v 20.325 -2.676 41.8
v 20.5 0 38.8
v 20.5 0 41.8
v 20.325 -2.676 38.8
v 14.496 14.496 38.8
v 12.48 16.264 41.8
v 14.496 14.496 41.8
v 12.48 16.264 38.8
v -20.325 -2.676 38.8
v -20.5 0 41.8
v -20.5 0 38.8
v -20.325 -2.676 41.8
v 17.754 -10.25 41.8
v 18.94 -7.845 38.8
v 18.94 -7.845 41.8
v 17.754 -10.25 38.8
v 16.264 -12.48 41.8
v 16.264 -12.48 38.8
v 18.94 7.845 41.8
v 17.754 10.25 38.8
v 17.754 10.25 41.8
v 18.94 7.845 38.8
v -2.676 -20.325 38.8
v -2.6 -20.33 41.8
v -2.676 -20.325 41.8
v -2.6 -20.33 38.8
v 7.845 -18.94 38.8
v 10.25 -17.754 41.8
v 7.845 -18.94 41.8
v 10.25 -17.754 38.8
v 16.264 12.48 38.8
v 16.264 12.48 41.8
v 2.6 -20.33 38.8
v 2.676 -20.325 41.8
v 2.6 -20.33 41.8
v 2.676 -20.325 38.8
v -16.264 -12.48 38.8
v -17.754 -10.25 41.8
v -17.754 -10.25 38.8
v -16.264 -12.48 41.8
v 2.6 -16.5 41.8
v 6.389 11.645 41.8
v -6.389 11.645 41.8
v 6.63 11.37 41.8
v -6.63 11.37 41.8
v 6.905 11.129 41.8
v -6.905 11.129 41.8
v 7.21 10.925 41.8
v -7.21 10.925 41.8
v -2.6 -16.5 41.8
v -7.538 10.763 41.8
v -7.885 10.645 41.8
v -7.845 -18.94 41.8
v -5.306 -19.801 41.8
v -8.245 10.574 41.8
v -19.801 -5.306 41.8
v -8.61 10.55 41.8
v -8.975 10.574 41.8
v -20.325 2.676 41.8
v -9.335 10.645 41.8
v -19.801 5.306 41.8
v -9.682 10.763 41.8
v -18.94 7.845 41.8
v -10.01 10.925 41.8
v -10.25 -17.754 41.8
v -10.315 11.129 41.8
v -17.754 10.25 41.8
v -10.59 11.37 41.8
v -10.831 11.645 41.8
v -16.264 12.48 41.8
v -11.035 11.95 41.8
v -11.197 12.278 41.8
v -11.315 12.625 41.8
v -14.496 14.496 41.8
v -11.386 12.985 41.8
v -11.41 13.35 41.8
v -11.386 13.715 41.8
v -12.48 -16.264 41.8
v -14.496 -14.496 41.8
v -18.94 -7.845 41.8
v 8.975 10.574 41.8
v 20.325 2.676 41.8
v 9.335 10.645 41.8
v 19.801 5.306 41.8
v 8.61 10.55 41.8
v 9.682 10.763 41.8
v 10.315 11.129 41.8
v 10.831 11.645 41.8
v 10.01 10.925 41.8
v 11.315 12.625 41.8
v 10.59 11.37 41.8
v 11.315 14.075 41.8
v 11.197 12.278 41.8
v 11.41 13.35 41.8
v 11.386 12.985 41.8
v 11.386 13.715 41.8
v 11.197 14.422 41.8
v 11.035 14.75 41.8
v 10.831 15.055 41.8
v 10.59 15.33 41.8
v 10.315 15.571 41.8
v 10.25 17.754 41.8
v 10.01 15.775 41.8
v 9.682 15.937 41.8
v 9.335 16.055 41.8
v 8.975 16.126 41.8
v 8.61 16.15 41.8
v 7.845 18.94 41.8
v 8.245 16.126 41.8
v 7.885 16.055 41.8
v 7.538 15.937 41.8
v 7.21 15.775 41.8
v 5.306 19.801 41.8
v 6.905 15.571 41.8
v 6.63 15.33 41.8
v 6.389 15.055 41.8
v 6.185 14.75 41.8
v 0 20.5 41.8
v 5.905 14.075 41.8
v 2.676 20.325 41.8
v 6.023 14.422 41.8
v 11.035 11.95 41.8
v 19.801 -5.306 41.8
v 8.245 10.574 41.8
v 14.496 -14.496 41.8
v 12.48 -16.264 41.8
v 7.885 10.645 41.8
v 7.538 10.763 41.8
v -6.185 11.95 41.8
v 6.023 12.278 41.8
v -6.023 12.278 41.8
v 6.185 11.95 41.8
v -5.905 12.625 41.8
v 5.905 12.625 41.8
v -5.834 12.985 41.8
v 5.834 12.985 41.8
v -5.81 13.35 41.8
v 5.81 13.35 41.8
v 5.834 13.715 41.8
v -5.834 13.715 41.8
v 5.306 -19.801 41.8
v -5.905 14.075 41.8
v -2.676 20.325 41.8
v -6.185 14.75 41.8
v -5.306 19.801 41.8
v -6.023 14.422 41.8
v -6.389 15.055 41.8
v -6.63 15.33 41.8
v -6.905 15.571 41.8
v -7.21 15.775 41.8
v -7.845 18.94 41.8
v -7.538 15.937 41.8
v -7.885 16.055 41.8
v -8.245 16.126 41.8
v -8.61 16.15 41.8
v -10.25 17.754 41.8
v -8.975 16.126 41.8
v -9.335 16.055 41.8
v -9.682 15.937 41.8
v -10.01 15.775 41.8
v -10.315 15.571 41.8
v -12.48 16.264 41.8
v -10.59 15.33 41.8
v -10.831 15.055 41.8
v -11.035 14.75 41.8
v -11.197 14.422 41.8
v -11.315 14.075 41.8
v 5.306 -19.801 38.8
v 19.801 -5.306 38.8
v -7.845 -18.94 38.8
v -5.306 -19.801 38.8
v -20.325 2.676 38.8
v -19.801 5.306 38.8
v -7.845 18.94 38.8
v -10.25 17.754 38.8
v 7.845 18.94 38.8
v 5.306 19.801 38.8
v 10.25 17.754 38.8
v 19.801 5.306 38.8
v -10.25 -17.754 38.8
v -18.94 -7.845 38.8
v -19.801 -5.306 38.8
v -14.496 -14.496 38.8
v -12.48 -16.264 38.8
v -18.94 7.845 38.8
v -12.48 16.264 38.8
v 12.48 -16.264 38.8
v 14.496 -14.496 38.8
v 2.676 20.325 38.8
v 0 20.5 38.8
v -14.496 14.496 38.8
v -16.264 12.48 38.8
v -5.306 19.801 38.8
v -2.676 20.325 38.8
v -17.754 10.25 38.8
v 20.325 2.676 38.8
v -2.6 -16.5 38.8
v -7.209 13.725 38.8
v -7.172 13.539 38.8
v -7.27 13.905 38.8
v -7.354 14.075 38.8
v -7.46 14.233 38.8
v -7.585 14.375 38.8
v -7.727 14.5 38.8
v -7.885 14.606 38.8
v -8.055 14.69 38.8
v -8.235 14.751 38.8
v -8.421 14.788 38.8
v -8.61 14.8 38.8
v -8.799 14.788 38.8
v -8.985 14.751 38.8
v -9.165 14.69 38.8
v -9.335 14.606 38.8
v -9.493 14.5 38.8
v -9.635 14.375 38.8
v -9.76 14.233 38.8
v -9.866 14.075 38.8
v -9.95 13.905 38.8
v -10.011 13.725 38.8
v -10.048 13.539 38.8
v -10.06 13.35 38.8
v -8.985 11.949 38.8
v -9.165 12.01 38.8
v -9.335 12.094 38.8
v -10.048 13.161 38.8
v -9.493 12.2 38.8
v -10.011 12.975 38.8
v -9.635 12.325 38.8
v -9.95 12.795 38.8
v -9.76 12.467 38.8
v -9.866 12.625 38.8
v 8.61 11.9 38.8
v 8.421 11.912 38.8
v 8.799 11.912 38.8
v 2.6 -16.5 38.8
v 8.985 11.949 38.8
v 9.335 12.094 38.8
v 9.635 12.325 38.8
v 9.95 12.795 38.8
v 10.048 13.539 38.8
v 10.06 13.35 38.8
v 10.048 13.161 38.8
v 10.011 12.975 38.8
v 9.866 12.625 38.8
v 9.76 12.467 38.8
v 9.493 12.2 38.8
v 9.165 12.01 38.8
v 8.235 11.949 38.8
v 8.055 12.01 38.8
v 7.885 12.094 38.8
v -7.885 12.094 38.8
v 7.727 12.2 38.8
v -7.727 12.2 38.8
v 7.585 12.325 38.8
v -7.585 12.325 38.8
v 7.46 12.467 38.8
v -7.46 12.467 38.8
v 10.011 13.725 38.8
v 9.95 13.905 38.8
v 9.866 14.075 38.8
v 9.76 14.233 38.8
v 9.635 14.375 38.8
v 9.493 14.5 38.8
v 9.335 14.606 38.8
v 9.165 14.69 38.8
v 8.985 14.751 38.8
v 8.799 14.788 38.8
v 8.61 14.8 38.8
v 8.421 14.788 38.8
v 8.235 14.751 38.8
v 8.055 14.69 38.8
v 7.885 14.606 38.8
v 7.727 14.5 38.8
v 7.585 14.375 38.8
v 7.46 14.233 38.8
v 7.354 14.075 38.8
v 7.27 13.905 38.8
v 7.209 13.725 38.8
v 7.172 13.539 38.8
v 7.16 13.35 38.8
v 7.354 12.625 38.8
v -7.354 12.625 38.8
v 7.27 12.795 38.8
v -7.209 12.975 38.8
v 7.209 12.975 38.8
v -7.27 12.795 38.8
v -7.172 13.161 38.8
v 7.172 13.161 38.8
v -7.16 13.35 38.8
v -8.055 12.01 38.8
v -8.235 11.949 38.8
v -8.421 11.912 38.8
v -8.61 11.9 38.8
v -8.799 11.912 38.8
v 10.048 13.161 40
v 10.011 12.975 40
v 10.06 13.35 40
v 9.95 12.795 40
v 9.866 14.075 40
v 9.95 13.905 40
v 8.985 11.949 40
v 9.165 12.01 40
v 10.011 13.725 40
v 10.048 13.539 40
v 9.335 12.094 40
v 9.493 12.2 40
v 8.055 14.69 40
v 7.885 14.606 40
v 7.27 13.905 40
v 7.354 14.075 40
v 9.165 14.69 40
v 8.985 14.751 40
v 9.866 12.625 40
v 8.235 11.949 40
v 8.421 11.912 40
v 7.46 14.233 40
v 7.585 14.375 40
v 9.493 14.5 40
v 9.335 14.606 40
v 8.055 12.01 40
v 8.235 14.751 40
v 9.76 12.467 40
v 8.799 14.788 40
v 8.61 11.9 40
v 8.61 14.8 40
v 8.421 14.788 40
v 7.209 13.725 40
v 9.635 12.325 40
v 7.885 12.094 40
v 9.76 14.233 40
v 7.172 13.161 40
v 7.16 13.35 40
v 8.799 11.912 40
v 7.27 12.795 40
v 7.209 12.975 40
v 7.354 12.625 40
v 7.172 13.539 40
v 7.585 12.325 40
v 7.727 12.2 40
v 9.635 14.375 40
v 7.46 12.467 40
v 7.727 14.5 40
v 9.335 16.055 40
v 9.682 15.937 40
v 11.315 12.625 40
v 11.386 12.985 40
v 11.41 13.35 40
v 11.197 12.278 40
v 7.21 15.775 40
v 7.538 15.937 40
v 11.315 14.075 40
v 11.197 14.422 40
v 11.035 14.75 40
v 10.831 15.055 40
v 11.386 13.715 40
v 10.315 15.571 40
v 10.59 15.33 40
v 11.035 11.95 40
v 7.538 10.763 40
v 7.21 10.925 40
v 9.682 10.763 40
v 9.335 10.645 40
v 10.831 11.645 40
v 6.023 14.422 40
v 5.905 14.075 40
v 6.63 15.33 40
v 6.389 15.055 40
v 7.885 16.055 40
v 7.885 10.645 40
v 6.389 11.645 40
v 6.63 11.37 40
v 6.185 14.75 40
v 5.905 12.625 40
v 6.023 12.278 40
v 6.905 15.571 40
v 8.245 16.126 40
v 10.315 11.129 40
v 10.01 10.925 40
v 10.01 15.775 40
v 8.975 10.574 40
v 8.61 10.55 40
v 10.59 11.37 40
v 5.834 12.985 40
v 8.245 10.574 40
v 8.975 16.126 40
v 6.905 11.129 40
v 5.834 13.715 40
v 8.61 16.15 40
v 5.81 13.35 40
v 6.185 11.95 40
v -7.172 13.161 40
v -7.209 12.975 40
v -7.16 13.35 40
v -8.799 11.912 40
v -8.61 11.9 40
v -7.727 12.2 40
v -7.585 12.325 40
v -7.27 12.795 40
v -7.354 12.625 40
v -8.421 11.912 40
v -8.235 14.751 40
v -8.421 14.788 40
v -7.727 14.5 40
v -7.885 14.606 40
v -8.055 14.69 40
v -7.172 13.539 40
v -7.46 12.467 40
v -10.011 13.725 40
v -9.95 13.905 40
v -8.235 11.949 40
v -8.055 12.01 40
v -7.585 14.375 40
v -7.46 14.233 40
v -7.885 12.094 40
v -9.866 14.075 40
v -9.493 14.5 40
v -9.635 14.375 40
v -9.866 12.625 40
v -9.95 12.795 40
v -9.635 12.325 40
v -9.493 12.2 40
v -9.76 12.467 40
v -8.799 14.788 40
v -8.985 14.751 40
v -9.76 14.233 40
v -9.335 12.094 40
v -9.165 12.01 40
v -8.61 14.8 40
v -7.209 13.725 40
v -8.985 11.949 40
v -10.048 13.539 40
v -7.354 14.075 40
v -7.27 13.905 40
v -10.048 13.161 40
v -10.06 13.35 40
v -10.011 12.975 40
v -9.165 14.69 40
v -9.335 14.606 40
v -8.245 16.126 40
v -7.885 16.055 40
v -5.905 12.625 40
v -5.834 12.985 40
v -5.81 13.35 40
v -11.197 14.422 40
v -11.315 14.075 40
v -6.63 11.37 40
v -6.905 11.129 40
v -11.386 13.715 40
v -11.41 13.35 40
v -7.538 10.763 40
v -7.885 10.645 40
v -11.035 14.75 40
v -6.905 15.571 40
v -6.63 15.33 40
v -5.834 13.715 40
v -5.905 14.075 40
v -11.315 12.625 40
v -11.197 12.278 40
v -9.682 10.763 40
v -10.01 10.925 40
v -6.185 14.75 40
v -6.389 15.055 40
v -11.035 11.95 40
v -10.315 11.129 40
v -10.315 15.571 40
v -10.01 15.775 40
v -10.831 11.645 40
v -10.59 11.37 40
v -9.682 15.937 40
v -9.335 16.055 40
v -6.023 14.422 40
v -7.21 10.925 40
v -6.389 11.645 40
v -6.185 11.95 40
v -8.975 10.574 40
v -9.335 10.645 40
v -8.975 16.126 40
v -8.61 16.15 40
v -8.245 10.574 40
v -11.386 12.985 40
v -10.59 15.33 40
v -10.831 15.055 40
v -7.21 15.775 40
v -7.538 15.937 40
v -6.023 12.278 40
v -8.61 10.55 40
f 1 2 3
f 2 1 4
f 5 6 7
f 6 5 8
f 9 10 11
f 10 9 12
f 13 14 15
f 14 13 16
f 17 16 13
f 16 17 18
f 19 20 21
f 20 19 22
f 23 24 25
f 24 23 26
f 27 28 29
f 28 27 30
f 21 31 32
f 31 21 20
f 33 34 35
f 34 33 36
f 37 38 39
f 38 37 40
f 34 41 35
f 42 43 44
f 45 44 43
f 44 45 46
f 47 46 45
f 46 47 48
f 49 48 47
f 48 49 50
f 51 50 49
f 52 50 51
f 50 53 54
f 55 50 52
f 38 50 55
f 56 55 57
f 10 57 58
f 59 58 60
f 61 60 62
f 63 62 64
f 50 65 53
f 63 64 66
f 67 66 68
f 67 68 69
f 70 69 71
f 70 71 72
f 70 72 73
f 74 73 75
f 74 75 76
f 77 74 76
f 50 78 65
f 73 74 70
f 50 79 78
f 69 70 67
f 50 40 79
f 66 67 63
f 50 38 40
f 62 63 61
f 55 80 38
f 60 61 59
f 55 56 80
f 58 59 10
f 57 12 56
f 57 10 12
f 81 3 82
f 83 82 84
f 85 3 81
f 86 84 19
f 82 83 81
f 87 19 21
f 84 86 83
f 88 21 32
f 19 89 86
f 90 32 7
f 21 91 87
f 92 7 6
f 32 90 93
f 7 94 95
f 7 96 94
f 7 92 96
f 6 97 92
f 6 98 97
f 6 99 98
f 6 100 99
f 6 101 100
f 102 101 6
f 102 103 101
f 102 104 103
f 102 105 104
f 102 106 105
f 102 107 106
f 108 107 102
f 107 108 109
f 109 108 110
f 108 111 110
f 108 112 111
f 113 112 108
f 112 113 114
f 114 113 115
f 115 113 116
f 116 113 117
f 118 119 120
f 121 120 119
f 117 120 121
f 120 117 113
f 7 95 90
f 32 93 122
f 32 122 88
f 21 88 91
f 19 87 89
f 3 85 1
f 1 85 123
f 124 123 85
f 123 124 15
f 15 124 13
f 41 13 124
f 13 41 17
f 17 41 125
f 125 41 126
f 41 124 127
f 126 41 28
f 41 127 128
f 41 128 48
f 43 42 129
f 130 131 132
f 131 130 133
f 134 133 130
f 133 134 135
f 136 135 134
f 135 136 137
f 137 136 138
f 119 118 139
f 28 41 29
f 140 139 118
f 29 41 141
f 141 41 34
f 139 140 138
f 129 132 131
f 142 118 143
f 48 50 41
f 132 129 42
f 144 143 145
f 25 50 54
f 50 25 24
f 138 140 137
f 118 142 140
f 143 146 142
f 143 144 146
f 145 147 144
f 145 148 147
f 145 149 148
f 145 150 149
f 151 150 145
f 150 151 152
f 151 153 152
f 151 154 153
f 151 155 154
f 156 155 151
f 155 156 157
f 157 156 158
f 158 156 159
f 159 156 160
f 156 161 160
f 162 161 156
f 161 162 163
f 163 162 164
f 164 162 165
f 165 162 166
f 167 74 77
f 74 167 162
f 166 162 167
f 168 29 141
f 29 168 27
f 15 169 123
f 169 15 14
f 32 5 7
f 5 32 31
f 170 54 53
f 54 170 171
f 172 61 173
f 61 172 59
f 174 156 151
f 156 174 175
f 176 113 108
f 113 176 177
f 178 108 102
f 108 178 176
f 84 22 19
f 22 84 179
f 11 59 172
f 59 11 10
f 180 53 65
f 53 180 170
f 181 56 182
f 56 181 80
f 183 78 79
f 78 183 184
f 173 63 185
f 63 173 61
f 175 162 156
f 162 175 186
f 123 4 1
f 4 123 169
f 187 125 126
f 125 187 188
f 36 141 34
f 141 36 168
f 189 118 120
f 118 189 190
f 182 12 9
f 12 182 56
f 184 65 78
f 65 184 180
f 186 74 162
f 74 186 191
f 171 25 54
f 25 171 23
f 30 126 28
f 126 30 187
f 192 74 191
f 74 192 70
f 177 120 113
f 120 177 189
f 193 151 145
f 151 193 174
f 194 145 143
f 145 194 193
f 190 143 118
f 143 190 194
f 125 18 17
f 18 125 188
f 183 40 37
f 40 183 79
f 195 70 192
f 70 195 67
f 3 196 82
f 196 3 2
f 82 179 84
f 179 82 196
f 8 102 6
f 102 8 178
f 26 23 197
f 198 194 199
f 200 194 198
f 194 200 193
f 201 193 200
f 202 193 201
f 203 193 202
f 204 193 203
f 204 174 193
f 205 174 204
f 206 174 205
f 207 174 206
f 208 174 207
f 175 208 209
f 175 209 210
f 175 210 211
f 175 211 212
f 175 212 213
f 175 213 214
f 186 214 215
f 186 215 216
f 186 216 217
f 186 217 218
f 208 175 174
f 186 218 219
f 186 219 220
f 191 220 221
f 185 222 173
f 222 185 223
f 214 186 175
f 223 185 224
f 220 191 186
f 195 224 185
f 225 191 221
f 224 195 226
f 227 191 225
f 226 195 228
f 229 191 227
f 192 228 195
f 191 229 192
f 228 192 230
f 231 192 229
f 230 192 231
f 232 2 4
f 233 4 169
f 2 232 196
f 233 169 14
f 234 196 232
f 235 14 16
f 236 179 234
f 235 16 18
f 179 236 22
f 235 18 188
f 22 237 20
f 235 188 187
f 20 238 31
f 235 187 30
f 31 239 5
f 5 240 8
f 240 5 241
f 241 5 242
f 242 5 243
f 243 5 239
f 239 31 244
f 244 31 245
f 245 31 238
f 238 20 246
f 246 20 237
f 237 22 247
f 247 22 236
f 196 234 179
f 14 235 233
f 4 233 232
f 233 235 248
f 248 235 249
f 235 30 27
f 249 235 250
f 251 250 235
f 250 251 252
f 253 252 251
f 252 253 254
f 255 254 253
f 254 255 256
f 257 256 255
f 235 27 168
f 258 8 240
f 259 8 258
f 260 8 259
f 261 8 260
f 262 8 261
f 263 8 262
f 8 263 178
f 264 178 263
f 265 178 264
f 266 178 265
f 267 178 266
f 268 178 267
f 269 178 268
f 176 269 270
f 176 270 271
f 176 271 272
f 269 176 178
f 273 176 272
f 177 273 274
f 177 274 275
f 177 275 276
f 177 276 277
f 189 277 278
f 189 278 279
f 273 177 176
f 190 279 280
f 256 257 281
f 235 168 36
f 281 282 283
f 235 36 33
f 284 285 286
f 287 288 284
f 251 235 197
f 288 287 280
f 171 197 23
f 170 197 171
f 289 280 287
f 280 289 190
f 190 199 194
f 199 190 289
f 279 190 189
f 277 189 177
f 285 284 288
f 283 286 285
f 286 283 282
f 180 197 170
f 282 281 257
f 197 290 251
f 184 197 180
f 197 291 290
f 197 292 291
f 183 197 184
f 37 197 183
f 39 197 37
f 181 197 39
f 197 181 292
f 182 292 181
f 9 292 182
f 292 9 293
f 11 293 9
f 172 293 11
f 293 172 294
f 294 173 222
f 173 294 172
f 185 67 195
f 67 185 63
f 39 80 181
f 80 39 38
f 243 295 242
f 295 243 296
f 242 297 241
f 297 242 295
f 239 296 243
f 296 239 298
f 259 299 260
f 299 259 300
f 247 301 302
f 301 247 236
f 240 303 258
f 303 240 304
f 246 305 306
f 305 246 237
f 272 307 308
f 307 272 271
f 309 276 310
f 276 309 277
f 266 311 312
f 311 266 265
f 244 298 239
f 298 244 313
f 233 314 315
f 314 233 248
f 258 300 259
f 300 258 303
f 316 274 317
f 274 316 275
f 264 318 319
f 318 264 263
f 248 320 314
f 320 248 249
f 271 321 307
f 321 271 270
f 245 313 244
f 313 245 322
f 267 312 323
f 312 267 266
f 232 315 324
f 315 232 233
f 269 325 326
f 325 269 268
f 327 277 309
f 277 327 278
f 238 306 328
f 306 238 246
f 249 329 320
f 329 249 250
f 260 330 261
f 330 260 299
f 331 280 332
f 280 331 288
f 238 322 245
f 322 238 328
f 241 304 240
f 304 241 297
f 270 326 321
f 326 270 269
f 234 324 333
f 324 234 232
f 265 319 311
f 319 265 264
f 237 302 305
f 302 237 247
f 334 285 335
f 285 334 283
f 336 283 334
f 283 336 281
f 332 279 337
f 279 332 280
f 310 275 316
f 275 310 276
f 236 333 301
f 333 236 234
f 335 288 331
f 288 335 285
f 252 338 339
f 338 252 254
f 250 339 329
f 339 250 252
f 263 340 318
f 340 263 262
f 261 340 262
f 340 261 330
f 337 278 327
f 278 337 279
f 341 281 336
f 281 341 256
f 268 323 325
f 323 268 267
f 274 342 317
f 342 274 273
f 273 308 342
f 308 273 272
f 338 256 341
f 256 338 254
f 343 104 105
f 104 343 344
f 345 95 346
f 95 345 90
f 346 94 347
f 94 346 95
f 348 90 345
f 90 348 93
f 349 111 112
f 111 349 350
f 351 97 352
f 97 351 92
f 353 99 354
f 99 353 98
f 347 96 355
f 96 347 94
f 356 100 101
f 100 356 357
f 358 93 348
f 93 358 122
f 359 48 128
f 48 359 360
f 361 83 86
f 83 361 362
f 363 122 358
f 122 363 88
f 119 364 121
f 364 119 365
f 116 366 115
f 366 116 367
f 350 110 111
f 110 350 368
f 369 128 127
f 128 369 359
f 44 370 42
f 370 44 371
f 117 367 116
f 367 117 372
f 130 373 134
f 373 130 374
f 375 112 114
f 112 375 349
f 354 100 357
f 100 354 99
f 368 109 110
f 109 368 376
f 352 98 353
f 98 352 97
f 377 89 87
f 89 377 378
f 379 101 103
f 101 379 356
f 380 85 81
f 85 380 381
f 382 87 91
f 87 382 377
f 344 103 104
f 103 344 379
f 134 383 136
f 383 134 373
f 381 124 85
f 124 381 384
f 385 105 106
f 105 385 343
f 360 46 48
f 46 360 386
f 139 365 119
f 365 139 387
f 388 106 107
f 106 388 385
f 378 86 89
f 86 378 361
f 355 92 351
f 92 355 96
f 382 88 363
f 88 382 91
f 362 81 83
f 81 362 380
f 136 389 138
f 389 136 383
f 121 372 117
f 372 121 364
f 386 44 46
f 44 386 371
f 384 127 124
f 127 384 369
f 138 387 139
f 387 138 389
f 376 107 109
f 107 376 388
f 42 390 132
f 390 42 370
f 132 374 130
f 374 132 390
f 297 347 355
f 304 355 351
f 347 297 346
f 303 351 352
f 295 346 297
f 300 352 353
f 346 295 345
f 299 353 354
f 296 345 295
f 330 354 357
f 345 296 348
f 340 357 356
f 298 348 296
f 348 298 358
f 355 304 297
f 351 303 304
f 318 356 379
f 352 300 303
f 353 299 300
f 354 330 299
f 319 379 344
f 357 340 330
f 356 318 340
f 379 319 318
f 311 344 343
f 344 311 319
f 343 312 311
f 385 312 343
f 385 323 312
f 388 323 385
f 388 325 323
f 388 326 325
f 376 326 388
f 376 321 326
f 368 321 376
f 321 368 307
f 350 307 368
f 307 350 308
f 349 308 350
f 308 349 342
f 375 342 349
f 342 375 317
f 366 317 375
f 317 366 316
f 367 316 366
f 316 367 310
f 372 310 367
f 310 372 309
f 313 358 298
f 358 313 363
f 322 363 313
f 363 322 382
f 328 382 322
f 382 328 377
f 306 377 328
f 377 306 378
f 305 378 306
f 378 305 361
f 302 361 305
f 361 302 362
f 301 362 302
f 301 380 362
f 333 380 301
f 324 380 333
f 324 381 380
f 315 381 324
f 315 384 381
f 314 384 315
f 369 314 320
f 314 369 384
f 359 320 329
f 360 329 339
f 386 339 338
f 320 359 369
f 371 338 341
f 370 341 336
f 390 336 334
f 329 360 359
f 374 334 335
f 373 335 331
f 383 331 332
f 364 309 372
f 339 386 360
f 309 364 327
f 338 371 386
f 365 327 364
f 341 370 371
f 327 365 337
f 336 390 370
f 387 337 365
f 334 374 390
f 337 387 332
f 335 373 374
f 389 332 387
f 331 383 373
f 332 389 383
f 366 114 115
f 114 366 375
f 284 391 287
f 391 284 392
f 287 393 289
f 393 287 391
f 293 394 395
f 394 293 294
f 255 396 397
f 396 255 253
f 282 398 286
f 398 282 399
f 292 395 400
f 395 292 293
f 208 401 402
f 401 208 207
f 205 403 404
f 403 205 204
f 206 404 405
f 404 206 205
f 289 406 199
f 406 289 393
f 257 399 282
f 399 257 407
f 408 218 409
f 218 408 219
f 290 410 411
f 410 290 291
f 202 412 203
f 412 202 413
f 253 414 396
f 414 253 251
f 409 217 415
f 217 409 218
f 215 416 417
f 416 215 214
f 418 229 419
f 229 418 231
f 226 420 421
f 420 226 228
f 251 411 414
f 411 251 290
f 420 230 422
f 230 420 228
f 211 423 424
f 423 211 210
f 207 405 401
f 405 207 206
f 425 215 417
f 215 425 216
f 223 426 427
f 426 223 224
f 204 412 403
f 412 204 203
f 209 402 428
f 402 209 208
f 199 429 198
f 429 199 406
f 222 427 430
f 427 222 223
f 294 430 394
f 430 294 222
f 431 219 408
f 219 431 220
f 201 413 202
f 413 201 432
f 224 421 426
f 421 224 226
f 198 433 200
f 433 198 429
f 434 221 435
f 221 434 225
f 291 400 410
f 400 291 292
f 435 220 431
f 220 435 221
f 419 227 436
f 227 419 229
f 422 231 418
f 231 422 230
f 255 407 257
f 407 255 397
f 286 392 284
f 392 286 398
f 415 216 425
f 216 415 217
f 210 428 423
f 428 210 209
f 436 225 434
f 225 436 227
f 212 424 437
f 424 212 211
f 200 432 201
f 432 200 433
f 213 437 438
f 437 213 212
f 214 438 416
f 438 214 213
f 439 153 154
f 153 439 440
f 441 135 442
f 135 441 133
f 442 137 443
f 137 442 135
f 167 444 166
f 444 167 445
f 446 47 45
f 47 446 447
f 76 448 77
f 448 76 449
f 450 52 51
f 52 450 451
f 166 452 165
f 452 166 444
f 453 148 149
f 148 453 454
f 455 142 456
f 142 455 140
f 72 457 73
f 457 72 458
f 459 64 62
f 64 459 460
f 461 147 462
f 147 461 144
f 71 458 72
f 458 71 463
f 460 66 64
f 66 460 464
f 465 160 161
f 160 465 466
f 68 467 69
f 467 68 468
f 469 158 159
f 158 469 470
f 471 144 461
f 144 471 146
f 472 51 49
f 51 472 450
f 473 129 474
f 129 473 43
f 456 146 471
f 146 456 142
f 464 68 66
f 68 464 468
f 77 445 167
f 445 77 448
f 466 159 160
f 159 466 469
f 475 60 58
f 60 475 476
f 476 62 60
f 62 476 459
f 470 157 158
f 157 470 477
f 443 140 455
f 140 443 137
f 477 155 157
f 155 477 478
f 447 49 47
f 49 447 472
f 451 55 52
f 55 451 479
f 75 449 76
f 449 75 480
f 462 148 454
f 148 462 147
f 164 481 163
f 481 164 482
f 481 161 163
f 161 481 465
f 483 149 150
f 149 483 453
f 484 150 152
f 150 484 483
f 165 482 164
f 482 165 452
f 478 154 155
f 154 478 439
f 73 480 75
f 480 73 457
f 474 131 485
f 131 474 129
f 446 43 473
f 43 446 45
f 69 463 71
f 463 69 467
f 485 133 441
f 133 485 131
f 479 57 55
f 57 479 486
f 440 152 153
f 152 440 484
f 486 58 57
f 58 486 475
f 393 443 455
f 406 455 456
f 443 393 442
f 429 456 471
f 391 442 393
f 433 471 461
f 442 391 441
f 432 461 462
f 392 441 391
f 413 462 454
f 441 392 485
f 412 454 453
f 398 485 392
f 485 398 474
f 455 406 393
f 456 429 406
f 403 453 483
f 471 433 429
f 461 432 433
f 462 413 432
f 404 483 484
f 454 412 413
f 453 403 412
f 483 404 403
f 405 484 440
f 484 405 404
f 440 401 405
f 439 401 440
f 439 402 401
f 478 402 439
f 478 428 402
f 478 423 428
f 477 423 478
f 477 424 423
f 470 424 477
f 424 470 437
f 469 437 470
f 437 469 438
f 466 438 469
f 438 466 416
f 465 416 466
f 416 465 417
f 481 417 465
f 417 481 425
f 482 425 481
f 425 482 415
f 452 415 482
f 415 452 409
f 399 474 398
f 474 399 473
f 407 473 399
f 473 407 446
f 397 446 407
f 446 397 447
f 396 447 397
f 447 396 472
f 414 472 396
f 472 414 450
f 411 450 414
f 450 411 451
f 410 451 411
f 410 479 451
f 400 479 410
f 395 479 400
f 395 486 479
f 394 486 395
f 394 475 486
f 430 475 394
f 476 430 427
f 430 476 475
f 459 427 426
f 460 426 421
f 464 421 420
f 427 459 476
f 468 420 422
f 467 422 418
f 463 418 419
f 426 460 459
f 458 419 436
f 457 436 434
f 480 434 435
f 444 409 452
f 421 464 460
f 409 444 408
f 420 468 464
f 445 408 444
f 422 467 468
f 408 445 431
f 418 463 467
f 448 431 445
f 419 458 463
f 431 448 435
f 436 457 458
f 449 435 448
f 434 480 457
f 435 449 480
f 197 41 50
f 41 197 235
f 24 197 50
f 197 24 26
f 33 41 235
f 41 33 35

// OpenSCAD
// right cartridge_cap_wroll: press F6 (render) then File > Export > STL
include <../lib/g1_servo_arm.scad>
side = "right";
part = "cartridge_cap_wroll";
